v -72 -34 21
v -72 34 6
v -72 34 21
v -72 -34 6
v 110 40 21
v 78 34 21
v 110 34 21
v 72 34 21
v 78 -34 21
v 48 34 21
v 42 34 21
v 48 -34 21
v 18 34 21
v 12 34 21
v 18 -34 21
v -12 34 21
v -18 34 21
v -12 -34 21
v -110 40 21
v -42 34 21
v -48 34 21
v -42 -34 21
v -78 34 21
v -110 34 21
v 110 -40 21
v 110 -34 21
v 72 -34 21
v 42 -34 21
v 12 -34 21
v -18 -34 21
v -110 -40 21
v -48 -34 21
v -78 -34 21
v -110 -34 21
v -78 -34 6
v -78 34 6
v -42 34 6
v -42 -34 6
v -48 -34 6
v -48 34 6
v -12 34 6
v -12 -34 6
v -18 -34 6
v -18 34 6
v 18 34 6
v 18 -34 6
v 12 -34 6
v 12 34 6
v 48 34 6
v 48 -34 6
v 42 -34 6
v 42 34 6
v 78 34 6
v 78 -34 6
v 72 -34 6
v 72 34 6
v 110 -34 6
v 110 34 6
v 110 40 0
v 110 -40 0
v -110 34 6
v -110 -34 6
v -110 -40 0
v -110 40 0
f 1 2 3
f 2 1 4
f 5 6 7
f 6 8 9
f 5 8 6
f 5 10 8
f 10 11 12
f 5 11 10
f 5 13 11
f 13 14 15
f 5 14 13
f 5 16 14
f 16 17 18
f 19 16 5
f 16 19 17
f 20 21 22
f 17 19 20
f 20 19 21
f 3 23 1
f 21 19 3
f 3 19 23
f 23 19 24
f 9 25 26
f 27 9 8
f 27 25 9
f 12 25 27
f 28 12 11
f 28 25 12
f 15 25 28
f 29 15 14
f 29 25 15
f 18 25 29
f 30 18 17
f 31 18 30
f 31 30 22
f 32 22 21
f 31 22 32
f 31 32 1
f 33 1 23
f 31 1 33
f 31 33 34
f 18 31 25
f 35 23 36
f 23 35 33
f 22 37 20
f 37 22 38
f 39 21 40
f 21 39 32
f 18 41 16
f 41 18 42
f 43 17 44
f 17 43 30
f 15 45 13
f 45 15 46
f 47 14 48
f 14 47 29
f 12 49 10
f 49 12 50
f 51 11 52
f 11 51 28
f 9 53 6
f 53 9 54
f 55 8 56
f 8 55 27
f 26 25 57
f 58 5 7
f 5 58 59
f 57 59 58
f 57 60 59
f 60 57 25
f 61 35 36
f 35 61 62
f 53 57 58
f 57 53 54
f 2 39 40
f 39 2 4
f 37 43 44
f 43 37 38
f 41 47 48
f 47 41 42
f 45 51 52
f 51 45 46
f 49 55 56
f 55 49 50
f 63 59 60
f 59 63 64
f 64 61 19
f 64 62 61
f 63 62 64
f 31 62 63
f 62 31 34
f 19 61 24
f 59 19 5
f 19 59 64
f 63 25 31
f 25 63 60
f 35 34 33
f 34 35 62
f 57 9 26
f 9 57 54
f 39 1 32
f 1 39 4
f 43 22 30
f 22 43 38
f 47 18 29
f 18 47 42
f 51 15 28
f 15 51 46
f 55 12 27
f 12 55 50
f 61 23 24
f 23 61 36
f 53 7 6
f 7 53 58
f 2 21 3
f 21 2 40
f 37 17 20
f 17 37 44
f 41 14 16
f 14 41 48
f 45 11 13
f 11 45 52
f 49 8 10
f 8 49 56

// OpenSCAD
$fn = 32;

// ----------------------------------------------------------------------
// Rib frame 220 x 80 x 21
// 6 ribs at 30 mm pitch
// ----------------------------------------------------------------------

// --- parameters (mm) ---
frame = [220, 80, 6];  // base plate size (x, y, z)
rail_w = 6;            // side rail width
ribs = 6;              // number of ribs
rib_t = 6;             // rib thickness
rib_h = 15;            // rib height above the base plate
pitch = 30;            // pitch between rib centres

// --- derived feature positions (mm) ---
span = (ribs - 1) * pitch;          // = 150   distance between the outer ribs
origin_x = -span / 2;               // = -75   X of the first rib
rib_len = frame[1] - 2 * rail_w + 2;  // = 70   rib length, 1 mm into each rail
feature_centers = [
  [origin_x + 0 * pitch, 0],
  [origin_x + 1 * pitch, 0],
  [origin_x + 2 * pitch, 0],
  [origin_x + 3 * pitch, 0],
  [origin_x + 4 * pitch, 0],
  [origin_x + 5 * pitch, 0]
];   // rib centre line, drives the rib loop

// base plate, two side rails, then the ribs read straight off feature_centers
union() {
  translate([-frame[0] / 2, -frame[1] / 2, 0]) cube(frame);
  translate([-frame[0] / 2, -frame[1] / 2, 0]) cube([frame[0], rail_w, frame[2] + rib_h]);
  translate([-frame[0] / 2, frame[1] / 2 - rail_w, 0]) cube([frame[0], rail_w, frame[2] + rib_h]);
  for (centre = feature_centers)
    translate([centre[0] - rib_t / 2, centre[1] - rib_len / 2, frame[2] - 1])
      cube([rib_t, rib_len, rib_h + 1]);
}
